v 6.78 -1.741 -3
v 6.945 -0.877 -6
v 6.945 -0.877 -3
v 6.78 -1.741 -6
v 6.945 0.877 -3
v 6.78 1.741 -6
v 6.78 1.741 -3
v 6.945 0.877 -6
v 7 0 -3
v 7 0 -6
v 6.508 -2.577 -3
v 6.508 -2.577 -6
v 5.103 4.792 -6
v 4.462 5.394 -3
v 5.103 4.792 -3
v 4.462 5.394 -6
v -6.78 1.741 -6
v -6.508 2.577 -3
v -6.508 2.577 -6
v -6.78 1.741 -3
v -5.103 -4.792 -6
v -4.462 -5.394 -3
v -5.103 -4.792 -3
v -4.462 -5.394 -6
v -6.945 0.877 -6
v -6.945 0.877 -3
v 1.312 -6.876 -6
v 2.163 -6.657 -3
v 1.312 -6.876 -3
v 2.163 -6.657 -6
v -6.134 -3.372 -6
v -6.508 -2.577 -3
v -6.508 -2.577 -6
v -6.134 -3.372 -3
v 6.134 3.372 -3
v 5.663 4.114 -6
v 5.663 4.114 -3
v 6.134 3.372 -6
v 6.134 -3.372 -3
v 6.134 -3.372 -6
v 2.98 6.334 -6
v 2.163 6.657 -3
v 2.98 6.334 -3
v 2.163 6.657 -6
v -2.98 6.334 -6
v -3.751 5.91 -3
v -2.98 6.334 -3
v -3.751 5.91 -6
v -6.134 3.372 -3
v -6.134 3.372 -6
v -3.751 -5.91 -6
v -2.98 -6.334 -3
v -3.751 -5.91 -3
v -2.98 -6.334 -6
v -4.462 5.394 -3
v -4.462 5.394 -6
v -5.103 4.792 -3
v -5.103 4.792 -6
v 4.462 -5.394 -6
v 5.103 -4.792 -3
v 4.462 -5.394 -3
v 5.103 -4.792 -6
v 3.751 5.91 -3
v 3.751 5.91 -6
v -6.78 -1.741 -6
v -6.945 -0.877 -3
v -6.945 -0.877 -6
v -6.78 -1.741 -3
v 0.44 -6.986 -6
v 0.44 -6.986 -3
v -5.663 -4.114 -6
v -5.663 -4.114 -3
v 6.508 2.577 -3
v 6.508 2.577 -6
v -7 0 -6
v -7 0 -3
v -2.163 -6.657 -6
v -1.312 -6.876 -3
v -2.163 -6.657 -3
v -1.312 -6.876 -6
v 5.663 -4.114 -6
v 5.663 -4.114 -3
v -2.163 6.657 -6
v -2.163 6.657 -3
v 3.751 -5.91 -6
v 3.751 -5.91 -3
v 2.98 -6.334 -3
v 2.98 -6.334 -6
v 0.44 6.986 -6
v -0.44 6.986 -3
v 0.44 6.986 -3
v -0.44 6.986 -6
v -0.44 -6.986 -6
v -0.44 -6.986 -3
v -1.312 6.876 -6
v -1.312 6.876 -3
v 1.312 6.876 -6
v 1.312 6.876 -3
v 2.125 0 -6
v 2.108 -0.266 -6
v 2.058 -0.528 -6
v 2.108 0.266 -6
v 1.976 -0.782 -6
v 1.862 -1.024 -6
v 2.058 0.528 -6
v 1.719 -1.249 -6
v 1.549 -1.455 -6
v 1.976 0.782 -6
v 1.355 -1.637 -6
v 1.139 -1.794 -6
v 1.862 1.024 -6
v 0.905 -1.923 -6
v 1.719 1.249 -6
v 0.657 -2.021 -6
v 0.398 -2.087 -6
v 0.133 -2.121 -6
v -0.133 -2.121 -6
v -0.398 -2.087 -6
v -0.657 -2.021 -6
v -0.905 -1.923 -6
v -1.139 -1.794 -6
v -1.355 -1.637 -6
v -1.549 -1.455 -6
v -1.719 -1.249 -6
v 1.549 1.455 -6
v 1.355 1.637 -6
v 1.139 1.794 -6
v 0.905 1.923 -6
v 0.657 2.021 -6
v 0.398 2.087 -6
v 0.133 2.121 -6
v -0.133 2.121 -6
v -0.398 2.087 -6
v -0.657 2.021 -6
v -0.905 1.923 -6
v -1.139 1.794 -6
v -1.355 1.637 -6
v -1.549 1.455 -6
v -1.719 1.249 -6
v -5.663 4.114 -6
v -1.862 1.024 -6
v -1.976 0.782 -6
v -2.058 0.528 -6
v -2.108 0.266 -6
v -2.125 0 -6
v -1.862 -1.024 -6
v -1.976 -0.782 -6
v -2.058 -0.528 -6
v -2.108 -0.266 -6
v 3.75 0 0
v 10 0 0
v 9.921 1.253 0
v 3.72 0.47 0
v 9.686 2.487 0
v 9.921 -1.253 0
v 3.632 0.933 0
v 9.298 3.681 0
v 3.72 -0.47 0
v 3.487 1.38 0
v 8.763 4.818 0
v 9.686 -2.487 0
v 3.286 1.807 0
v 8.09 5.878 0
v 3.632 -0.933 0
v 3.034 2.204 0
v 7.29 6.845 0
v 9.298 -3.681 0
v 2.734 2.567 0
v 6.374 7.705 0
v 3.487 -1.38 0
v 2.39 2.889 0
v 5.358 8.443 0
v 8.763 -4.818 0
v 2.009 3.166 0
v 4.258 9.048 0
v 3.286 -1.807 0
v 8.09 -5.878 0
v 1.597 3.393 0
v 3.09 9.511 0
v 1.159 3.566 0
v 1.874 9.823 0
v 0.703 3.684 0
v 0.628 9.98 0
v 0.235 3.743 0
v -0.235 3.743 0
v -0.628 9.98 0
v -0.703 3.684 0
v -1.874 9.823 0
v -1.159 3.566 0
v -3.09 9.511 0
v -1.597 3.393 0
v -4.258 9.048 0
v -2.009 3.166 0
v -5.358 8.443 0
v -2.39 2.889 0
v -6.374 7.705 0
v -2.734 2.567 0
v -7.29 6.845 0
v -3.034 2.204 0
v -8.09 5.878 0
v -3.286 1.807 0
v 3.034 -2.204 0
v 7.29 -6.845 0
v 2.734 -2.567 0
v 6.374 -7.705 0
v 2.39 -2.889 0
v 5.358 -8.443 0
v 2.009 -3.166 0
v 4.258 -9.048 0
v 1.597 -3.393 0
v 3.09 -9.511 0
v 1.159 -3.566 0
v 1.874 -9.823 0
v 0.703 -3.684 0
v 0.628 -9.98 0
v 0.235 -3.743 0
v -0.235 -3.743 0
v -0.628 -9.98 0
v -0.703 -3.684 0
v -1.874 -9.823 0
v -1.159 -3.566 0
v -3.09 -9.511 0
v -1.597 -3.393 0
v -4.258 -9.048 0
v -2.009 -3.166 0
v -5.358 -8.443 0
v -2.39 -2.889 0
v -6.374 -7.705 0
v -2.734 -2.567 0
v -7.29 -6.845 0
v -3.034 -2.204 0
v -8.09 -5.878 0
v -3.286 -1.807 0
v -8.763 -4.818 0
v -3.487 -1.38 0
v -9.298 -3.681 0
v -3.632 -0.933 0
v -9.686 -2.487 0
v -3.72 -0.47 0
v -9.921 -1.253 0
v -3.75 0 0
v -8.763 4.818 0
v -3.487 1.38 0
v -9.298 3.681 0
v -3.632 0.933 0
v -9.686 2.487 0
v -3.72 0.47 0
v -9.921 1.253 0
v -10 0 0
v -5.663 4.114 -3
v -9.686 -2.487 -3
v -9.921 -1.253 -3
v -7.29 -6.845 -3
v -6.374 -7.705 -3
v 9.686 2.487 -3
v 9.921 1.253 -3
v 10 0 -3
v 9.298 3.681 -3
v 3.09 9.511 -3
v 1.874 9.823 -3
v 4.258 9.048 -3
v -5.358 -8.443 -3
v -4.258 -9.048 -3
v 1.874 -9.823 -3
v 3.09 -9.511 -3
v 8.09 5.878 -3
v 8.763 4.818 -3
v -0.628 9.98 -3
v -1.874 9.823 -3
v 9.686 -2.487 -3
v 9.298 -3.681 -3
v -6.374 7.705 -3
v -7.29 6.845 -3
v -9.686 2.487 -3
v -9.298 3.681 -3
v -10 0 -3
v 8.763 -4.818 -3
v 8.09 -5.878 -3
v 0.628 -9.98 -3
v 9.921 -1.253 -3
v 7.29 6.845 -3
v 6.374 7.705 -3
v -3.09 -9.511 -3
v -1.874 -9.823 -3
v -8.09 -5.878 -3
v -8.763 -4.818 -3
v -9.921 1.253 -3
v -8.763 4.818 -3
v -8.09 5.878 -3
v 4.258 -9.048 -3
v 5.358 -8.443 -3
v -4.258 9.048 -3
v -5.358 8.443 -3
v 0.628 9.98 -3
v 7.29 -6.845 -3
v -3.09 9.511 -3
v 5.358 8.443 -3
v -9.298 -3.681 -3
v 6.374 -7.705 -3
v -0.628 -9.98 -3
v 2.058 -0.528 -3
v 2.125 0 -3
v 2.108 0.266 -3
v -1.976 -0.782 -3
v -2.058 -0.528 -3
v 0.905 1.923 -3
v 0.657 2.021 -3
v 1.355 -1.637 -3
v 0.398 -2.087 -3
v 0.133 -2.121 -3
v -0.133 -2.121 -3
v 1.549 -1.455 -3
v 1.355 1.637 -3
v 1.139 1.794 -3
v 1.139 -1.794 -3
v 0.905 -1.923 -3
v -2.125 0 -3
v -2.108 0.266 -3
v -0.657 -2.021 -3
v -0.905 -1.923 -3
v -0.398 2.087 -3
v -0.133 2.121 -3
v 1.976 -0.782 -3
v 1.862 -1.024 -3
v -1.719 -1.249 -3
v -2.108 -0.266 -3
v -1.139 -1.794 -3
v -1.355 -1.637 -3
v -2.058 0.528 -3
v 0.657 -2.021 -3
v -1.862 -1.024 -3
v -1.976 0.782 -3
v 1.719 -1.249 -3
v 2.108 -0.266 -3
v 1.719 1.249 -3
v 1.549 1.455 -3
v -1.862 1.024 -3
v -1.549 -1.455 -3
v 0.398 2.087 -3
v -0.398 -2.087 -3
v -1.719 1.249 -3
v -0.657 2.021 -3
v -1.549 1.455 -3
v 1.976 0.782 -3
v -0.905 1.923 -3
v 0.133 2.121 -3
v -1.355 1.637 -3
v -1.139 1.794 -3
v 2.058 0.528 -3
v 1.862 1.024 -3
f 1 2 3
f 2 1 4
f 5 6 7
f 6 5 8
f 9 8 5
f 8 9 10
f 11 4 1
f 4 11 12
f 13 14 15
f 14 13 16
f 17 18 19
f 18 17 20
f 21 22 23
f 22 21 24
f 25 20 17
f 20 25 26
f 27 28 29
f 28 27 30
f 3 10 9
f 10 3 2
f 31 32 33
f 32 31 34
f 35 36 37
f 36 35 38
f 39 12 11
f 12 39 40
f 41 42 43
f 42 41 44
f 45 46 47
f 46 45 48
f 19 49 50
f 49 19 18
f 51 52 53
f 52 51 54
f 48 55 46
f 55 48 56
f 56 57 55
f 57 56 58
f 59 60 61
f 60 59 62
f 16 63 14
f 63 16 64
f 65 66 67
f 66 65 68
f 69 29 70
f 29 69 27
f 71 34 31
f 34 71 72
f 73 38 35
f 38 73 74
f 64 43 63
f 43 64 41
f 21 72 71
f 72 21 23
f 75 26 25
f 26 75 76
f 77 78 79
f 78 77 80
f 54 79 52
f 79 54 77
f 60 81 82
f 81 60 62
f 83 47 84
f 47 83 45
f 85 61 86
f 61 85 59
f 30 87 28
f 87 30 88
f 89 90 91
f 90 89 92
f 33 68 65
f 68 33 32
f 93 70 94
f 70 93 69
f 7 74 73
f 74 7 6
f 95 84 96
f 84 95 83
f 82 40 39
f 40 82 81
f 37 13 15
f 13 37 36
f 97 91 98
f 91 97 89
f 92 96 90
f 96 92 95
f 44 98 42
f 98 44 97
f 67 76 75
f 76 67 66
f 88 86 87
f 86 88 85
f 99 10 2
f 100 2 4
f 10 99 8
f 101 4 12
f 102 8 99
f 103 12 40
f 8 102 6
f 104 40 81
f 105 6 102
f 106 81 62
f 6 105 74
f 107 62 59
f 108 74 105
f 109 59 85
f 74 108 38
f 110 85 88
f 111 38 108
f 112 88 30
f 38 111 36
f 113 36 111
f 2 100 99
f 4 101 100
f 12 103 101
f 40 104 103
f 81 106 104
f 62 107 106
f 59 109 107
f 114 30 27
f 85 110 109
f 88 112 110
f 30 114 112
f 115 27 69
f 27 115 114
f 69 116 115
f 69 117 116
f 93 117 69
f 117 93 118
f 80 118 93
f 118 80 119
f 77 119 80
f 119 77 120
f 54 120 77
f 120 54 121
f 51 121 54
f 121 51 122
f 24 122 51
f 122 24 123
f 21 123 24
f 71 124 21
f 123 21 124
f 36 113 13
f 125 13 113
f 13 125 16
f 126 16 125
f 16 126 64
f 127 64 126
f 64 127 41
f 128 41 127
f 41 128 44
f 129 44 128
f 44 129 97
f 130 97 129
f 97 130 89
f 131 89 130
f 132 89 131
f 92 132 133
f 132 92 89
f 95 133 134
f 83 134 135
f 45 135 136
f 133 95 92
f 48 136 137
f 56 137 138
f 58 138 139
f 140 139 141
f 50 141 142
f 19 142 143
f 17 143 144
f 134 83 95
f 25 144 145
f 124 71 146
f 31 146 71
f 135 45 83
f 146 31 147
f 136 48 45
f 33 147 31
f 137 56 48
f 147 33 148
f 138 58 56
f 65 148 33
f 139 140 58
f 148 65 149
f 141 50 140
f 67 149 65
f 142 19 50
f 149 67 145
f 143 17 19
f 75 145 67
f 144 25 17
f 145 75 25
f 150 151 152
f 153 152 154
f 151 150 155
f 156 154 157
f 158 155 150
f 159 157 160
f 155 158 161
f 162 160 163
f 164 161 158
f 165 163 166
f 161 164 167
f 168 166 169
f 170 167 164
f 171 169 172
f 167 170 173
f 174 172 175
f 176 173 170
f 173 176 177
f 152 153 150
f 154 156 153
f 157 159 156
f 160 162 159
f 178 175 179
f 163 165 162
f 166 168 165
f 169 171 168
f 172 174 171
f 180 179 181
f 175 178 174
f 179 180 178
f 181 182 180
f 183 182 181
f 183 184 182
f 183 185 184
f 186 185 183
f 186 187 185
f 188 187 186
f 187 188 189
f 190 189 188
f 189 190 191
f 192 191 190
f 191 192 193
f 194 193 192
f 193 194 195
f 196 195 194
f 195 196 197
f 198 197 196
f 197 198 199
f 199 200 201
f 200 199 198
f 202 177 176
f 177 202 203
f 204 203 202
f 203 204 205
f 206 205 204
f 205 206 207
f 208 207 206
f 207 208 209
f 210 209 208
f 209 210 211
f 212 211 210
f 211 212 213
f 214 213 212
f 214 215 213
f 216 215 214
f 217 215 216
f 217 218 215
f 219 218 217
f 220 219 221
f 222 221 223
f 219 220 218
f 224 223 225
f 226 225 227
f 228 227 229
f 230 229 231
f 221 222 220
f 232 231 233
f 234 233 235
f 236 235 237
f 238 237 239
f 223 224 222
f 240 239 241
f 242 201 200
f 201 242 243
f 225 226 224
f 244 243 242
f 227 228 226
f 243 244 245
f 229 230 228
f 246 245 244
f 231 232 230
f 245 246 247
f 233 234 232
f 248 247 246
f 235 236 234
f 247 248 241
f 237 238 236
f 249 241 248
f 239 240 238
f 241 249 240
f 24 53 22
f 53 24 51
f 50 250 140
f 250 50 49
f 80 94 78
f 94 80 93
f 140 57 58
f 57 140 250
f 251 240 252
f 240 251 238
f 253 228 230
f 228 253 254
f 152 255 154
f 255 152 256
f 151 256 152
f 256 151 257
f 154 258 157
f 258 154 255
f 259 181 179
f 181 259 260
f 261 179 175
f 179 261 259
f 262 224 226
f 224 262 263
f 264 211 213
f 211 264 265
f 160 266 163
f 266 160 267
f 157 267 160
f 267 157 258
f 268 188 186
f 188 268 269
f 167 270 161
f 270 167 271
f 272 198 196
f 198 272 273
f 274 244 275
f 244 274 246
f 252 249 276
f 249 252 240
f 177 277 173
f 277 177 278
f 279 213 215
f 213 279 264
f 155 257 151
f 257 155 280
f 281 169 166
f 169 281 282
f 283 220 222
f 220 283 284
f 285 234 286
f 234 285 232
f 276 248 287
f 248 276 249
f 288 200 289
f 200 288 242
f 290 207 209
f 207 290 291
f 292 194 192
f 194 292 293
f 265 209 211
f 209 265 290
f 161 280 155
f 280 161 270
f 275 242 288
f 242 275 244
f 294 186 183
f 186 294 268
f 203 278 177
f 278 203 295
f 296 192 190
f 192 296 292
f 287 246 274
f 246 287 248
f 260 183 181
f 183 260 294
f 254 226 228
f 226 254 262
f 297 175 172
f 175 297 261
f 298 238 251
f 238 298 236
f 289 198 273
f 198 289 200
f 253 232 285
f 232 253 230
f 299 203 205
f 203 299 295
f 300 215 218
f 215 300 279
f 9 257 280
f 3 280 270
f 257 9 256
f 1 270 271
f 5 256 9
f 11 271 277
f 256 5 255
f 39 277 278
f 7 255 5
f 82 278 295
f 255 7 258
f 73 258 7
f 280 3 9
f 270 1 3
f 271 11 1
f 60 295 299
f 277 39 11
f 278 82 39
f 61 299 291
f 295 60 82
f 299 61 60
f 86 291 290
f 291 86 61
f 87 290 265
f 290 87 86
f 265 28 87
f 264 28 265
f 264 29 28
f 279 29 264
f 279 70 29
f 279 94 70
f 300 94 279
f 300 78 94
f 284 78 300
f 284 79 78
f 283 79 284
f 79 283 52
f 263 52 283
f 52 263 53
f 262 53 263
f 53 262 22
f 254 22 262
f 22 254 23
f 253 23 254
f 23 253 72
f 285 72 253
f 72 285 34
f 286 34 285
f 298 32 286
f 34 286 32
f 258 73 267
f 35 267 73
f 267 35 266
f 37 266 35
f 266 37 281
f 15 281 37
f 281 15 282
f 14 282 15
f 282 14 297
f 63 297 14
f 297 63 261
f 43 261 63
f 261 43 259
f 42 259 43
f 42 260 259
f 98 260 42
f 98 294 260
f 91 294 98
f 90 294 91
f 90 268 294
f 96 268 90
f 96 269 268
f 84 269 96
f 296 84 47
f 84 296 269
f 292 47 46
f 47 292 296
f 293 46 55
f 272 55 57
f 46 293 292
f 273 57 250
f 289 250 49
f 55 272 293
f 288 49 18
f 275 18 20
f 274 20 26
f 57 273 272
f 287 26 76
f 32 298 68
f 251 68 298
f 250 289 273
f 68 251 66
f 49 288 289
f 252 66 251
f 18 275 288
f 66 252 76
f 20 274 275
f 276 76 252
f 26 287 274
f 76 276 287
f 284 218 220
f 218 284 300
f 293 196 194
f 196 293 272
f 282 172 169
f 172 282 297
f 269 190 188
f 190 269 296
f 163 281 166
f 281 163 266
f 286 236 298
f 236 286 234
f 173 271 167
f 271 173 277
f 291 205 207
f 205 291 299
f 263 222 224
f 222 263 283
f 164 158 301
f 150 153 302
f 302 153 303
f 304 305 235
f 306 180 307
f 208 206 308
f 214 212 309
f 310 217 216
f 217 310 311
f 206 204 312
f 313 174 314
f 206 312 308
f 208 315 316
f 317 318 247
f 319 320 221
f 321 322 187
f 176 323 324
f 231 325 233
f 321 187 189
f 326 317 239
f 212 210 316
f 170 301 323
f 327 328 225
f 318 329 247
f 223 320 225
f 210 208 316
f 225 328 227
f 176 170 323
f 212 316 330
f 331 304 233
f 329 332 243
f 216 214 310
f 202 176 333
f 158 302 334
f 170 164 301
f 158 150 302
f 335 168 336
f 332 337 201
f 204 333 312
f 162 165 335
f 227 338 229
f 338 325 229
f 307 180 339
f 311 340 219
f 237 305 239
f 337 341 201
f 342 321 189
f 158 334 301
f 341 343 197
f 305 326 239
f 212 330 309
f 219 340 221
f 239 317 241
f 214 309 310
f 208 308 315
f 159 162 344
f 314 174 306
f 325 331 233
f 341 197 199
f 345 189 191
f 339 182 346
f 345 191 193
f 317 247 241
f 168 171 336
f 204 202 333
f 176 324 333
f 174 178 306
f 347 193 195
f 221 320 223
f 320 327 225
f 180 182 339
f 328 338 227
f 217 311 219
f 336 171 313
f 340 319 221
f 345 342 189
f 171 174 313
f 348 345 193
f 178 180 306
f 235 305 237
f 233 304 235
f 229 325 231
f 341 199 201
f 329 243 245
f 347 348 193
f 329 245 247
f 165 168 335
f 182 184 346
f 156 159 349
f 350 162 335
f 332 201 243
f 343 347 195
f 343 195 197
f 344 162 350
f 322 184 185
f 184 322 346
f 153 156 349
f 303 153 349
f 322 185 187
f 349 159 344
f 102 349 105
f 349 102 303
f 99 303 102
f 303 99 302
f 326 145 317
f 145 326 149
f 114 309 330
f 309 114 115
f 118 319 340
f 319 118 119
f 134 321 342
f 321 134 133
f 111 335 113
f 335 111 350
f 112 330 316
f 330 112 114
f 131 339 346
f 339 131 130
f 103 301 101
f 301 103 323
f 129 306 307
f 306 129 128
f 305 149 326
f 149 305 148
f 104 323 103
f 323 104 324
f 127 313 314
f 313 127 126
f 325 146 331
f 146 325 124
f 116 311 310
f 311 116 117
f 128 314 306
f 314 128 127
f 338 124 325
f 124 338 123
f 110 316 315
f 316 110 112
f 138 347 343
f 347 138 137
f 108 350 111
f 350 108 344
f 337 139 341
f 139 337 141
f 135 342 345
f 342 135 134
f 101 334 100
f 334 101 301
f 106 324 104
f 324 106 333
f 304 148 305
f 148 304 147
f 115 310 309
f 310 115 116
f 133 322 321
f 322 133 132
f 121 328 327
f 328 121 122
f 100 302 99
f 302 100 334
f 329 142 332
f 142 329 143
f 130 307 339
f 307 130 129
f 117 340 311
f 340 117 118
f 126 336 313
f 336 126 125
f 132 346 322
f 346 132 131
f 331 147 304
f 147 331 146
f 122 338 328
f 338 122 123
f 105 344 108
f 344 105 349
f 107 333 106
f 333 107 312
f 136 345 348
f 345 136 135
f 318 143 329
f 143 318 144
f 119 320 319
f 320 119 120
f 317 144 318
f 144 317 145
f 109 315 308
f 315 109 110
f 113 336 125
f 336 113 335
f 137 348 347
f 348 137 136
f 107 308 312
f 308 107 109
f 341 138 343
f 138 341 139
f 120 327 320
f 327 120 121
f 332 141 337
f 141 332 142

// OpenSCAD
$fn = 50;


difference() {
	union() {
		translate(v = [0, 0, -6.0000000000]) {
			cylinder(h = 6, r = 7.0000000000);
		}
		translate(v = [0, 0, -3.0000000000]) {
			cylinder(h = 3, r = 10.0000000000);
		}
	}
	union() {
		translate(v = [0, 0, 0]) {
			rotate(a = [0, 0, 0]) {
				difference() {
					union() {
						#translate(v = [0, 0, -6.0000000000]) {
							cylinder(h = 6, r = 2.0000000000);
						}
						#translate(v = [0, 0, -3]) {
							cylinder(h = 3, r = 7.0000000000, r1 = 2.1250000000, r2 = 3.7500000000);
						}
						#translate(v = [0, 0, -6.0000000000]) {
							cylinder(h = 6, r = 2.1250000000);
						}
						#translate(v = [0, 0, -6.0000000000]) {
							cylinder(h = 6, r = 2.0000000000);
						}
					}
					union();
				}
			}
		}
	}
}
